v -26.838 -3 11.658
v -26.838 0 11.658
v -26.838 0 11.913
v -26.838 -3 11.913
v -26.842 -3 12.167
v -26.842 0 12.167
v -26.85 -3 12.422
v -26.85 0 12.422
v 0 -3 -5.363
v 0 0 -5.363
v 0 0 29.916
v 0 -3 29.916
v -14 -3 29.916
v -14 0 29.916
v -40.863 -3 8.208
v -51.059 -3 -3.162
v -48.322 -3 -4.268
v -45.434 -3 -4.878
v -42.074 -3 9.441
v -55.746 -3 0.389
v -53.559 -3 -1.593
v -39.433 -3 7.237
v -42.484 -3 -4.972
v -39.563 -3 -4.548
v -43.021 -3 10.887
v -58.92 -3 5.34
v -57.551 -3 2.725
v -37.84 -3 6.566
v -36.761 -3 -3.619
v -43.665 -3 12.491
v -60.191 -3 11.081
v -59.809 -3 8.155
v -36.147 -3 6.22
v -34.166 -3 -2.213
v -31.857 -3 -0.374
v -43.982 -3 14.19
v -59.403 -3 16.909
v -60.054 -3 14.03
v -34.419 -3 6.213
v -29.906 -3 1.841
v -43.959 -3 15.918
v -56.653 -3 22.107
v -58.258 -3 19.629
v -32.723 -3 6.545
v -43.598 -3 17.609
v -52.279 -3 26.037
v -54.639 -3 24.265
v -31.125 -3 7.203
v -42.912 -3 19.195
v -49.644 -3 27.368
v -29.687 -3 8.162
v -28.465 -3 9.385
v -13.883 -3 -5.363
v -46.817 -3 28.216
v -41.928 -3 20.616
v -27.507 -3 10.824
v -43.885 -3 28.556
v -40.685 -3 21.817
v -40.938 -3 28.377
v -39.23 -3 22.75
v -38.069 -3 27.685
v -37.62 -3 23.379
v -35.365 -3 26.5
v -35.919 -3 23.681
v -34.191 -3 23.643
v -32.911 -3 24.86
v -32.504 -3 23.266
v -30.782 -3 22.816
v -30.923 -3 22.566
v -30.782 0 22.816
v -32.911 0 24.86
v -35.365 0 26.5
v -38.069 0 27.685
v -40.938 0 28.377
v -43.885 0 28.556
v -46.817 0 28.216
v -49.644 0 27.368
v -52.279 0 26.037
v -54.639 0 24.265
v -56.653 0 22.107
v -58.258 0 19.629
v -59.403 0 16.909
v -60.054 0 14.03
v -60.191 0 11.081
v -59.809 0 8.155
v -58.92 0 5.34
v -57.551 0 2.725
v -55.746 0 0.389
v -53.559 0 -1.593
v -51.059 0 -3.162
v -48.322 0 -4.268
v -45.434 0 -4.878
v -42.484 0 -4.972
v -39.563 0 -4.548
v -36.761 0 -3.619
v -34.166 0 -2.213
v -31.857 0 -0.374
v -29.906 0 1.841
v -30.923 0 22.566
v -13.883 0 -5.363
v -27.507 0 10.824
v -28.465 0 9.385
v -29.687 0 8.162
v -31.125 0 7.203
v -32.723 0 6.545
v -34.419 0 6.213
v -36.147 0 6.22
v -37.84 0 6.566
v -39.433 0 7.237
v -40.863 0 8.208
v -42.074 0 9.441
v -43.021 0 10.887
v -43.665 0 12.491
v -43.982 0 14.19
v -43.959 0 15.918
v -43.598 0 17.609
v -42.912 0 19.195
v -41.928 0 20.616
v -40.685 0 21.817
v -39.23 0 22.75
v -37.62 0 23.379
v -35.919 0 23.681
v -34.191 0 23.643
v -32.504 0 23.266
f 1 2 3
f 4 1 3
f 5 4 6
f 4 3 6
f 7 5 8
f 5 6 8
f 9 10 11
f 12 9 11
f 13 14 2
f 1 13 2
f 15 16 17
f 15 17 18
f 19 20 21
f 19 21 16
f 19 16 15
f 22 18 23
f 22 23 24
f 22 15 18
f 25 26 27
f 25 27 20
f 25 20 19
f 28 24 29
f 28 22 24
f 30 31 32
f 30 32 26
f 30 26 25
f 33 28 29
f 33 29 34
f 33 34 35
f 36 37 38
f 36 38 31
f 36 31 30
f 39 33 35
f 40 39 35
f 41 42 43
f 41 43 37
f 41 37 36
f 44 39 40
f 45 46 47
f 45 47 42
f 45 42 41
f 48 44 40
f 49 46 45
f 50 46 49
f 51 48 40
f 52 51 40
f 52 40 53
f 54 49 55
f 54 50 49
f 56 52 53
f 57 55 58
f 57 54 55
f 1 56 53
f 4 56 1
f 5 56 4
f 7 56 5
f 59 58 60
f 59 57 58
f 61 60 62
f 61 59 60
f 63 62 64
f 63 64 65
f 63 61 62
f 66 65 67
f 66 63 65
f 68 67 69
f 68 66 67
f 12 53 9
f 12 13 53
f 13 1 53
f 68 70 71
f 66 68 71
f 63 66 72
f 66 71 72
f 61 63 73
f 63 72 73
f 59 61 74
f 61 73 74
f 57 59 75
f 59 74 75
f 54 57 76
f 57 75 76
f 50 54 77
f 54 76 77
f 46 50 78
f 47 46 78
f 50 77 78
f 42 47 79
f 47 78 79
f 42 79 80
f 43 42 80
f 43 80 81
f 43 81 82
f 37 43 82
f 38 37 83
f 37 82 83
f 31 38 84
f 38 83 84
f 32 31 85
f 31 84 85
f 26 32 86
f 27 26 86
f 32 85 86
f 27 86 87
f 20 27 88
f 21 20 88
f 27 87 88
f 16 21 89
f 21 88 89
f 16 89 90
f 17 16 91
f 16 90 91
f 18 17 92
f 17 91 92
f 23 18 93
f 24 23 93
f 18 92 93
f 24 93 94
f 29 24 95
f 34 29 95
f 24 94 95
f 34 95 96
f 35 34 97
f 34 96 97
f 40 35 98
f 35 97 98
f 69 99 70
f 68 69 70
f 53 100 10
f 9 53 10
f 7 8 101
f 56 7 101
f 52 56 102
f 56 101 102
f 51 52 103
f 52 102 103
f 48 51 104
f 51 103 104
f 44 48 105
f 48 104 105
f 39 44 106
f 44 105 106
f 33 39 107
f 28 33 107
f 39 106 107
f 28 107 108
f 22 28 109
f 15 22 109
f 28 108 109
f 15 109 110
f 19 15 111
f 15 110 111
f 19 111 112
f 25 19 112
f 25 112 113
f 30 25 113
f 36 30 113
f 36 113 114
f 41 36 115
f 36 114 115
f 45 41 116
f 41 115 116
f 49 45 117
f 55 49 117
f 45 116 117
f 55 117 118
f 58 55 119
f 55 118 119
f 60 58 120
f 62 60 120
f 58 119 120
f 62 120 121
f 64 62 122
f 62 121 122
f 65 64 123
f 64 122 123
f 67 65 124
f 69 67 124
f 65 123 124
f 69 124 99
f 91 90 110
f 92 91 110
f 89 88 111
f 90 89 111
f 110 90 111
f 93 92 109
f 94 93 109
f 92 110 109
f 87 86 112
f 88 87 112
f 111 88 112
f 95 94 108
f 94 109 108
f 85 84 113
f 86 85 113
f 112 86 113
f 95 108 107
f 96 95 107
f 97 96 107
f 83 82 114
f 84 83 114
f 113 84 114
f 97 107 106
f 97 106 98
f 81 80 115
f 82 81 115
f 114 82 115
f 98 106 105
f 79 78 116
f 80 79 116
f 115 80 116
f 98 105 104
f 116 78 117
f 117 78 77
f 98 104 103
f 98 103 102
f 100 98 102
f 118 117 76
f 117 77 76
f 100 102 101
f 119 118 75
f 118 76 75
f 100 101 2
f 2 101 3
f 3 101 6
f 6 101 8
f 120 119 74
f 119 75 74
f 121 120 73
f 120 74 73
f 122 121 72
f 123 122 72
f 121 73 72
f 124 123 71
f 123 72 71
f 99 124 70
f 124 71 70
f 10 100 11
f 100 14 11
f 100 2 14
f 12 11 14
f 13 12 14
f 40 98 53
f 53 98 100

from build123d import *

# Parameters (mm, degrees)
F1_DEPTH = 3


with BuildPart() as f1:
    # F0 (on Front) → F1 (new body)
    with BuildSketch(Plane.XZ):
        with BuildLine():
            Line((0, -5.363059), (0, 29.916195))
            Line((0, 29.916195), (-14.000191, 29.916195))
            Line((-14.000191, 29.916195), (-26.837912, 11.658107))
            ThreePointArc((-26.837912, 11.658107), (-26.839461, 12.040159), (-26.849809, 12.422075))
            ThreePointArc((-26.849809, 12.422075), (-43.382305, 11.673262), (-30.923461, 22.566442))
            Line((-30.923461, 22.566442), (-30.782148, 22.815704))
            ThreePointArc((-30.782148, 22.815704), (-60.191077, 11.081451), (-29.905884, 1.841057))
            Line((-29.905884, 1.841057), (-13.883179, -5.363059))
            Line((-13.883179, -5.363059), (0, -5.363059))
        make_face()
    extrude(amount=F1_DEPTH)


solid = f1.part
